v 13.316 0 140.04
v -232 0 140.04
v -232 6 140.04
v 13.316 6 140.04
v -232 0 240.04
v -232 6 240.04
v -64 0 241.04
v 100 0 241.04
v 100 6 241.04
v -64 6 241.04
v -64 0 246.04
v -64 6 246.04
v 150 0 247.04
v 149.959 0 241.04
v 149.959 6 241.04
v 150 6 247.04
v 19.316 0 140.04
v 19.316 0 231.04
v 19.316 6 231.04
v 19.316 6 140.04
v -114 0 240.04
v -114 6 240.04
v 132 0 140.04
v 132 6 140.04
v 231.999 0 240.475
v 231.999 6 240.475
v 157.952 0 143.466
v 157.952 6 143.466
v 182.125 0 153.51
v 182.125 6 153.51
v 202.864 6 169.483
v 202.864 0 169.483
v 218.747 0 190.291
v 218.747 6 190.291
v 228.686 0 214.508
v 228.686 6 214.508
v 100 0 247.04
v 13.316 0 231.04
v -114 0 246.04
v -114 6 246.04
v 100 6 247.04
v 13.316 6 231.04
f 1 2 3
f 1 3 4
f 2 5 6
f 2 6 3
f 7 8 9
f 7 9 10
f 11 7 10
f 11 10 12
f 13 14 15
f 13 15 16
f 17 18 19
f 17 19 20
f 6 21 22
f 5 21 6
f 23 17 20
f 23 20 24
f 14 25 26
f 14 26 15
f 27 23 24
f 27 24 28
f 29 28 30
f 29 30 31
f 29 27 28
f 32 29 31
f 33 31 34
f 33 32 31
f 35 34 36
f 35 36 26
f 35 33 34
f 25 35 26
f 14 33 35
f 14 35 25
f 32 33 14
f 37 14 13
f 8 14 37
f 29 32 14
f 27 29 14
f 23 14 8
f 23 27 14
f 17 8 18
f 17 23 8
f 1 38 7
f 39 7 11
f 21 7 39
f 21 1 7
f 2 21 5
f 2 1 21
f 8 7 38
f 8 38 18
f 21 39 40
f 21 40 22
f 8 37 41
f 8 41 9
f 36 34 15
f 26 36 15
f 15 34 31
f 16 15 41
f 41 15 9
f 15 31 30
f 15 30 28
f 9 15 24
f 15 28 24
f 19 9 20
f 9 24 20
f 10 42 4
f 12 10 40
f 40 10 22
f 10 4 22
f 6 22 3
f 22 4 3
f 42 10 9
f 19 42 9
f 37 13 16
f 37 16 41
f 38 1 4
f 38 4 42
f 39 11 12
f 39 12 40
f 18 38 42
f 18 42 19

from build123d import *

# Parameters (mm, degrees)
BOSS_EXTRUDE1_DEPTH = 6


with BuildPart() as part:
    # Sketch1 → Boss-Extrude1 (new body)
    with BuildSketch(Plane(origin=(0, 0, 0), x_dir=(1, 0, 0), z_dir=(0, 1, 0))):
        with BuildLine():
            Line((-232, -140.040234189), (13.316058598, -140.040234189))
            Line((13.316058598, -140.040234189), (13.316058598, -231.040234189))
            Line((13.316058598, -231.040234189), (19.316058598, -231.040234189))
            Line((19.316058598, -231.040234189), (19.316058598, -140.040234189))
            Line((19.316058598, -140.040234189), (132, -140.040234189))
            ThreePointArc((132, -140.040234189), (202.864098928, -169.483310481), (231.999056434, -240.474644527))
            Line((231.999056434, -240.474644527), (149.958626336, -241.040376839))
            Line((149.958626336, -241.040376839), (150, -247.040234189))
            Line((150, -247.040234189), (100, -247.040234189))
            Line((100, -247.040234189), (100, -241.040234189))
            Line((100, -241.040234189), (-64, -241.040234189))
            Line((-64, -241.040234189), (-64, -246.040234189))
            Line((-64, -246.040234189), (-114, -246.040234189))
            Line((-114, -246.040234189), (-114, -240.040234189))
            Line((-114, -240.040234189), (-232, -240.040234189))
            Line((-232, -240.040234189), (-232, -140.040234189))
        make_face()
    extrude(amount=BOSS_EXTRUDE1_DEPTH)


solid = part.part
